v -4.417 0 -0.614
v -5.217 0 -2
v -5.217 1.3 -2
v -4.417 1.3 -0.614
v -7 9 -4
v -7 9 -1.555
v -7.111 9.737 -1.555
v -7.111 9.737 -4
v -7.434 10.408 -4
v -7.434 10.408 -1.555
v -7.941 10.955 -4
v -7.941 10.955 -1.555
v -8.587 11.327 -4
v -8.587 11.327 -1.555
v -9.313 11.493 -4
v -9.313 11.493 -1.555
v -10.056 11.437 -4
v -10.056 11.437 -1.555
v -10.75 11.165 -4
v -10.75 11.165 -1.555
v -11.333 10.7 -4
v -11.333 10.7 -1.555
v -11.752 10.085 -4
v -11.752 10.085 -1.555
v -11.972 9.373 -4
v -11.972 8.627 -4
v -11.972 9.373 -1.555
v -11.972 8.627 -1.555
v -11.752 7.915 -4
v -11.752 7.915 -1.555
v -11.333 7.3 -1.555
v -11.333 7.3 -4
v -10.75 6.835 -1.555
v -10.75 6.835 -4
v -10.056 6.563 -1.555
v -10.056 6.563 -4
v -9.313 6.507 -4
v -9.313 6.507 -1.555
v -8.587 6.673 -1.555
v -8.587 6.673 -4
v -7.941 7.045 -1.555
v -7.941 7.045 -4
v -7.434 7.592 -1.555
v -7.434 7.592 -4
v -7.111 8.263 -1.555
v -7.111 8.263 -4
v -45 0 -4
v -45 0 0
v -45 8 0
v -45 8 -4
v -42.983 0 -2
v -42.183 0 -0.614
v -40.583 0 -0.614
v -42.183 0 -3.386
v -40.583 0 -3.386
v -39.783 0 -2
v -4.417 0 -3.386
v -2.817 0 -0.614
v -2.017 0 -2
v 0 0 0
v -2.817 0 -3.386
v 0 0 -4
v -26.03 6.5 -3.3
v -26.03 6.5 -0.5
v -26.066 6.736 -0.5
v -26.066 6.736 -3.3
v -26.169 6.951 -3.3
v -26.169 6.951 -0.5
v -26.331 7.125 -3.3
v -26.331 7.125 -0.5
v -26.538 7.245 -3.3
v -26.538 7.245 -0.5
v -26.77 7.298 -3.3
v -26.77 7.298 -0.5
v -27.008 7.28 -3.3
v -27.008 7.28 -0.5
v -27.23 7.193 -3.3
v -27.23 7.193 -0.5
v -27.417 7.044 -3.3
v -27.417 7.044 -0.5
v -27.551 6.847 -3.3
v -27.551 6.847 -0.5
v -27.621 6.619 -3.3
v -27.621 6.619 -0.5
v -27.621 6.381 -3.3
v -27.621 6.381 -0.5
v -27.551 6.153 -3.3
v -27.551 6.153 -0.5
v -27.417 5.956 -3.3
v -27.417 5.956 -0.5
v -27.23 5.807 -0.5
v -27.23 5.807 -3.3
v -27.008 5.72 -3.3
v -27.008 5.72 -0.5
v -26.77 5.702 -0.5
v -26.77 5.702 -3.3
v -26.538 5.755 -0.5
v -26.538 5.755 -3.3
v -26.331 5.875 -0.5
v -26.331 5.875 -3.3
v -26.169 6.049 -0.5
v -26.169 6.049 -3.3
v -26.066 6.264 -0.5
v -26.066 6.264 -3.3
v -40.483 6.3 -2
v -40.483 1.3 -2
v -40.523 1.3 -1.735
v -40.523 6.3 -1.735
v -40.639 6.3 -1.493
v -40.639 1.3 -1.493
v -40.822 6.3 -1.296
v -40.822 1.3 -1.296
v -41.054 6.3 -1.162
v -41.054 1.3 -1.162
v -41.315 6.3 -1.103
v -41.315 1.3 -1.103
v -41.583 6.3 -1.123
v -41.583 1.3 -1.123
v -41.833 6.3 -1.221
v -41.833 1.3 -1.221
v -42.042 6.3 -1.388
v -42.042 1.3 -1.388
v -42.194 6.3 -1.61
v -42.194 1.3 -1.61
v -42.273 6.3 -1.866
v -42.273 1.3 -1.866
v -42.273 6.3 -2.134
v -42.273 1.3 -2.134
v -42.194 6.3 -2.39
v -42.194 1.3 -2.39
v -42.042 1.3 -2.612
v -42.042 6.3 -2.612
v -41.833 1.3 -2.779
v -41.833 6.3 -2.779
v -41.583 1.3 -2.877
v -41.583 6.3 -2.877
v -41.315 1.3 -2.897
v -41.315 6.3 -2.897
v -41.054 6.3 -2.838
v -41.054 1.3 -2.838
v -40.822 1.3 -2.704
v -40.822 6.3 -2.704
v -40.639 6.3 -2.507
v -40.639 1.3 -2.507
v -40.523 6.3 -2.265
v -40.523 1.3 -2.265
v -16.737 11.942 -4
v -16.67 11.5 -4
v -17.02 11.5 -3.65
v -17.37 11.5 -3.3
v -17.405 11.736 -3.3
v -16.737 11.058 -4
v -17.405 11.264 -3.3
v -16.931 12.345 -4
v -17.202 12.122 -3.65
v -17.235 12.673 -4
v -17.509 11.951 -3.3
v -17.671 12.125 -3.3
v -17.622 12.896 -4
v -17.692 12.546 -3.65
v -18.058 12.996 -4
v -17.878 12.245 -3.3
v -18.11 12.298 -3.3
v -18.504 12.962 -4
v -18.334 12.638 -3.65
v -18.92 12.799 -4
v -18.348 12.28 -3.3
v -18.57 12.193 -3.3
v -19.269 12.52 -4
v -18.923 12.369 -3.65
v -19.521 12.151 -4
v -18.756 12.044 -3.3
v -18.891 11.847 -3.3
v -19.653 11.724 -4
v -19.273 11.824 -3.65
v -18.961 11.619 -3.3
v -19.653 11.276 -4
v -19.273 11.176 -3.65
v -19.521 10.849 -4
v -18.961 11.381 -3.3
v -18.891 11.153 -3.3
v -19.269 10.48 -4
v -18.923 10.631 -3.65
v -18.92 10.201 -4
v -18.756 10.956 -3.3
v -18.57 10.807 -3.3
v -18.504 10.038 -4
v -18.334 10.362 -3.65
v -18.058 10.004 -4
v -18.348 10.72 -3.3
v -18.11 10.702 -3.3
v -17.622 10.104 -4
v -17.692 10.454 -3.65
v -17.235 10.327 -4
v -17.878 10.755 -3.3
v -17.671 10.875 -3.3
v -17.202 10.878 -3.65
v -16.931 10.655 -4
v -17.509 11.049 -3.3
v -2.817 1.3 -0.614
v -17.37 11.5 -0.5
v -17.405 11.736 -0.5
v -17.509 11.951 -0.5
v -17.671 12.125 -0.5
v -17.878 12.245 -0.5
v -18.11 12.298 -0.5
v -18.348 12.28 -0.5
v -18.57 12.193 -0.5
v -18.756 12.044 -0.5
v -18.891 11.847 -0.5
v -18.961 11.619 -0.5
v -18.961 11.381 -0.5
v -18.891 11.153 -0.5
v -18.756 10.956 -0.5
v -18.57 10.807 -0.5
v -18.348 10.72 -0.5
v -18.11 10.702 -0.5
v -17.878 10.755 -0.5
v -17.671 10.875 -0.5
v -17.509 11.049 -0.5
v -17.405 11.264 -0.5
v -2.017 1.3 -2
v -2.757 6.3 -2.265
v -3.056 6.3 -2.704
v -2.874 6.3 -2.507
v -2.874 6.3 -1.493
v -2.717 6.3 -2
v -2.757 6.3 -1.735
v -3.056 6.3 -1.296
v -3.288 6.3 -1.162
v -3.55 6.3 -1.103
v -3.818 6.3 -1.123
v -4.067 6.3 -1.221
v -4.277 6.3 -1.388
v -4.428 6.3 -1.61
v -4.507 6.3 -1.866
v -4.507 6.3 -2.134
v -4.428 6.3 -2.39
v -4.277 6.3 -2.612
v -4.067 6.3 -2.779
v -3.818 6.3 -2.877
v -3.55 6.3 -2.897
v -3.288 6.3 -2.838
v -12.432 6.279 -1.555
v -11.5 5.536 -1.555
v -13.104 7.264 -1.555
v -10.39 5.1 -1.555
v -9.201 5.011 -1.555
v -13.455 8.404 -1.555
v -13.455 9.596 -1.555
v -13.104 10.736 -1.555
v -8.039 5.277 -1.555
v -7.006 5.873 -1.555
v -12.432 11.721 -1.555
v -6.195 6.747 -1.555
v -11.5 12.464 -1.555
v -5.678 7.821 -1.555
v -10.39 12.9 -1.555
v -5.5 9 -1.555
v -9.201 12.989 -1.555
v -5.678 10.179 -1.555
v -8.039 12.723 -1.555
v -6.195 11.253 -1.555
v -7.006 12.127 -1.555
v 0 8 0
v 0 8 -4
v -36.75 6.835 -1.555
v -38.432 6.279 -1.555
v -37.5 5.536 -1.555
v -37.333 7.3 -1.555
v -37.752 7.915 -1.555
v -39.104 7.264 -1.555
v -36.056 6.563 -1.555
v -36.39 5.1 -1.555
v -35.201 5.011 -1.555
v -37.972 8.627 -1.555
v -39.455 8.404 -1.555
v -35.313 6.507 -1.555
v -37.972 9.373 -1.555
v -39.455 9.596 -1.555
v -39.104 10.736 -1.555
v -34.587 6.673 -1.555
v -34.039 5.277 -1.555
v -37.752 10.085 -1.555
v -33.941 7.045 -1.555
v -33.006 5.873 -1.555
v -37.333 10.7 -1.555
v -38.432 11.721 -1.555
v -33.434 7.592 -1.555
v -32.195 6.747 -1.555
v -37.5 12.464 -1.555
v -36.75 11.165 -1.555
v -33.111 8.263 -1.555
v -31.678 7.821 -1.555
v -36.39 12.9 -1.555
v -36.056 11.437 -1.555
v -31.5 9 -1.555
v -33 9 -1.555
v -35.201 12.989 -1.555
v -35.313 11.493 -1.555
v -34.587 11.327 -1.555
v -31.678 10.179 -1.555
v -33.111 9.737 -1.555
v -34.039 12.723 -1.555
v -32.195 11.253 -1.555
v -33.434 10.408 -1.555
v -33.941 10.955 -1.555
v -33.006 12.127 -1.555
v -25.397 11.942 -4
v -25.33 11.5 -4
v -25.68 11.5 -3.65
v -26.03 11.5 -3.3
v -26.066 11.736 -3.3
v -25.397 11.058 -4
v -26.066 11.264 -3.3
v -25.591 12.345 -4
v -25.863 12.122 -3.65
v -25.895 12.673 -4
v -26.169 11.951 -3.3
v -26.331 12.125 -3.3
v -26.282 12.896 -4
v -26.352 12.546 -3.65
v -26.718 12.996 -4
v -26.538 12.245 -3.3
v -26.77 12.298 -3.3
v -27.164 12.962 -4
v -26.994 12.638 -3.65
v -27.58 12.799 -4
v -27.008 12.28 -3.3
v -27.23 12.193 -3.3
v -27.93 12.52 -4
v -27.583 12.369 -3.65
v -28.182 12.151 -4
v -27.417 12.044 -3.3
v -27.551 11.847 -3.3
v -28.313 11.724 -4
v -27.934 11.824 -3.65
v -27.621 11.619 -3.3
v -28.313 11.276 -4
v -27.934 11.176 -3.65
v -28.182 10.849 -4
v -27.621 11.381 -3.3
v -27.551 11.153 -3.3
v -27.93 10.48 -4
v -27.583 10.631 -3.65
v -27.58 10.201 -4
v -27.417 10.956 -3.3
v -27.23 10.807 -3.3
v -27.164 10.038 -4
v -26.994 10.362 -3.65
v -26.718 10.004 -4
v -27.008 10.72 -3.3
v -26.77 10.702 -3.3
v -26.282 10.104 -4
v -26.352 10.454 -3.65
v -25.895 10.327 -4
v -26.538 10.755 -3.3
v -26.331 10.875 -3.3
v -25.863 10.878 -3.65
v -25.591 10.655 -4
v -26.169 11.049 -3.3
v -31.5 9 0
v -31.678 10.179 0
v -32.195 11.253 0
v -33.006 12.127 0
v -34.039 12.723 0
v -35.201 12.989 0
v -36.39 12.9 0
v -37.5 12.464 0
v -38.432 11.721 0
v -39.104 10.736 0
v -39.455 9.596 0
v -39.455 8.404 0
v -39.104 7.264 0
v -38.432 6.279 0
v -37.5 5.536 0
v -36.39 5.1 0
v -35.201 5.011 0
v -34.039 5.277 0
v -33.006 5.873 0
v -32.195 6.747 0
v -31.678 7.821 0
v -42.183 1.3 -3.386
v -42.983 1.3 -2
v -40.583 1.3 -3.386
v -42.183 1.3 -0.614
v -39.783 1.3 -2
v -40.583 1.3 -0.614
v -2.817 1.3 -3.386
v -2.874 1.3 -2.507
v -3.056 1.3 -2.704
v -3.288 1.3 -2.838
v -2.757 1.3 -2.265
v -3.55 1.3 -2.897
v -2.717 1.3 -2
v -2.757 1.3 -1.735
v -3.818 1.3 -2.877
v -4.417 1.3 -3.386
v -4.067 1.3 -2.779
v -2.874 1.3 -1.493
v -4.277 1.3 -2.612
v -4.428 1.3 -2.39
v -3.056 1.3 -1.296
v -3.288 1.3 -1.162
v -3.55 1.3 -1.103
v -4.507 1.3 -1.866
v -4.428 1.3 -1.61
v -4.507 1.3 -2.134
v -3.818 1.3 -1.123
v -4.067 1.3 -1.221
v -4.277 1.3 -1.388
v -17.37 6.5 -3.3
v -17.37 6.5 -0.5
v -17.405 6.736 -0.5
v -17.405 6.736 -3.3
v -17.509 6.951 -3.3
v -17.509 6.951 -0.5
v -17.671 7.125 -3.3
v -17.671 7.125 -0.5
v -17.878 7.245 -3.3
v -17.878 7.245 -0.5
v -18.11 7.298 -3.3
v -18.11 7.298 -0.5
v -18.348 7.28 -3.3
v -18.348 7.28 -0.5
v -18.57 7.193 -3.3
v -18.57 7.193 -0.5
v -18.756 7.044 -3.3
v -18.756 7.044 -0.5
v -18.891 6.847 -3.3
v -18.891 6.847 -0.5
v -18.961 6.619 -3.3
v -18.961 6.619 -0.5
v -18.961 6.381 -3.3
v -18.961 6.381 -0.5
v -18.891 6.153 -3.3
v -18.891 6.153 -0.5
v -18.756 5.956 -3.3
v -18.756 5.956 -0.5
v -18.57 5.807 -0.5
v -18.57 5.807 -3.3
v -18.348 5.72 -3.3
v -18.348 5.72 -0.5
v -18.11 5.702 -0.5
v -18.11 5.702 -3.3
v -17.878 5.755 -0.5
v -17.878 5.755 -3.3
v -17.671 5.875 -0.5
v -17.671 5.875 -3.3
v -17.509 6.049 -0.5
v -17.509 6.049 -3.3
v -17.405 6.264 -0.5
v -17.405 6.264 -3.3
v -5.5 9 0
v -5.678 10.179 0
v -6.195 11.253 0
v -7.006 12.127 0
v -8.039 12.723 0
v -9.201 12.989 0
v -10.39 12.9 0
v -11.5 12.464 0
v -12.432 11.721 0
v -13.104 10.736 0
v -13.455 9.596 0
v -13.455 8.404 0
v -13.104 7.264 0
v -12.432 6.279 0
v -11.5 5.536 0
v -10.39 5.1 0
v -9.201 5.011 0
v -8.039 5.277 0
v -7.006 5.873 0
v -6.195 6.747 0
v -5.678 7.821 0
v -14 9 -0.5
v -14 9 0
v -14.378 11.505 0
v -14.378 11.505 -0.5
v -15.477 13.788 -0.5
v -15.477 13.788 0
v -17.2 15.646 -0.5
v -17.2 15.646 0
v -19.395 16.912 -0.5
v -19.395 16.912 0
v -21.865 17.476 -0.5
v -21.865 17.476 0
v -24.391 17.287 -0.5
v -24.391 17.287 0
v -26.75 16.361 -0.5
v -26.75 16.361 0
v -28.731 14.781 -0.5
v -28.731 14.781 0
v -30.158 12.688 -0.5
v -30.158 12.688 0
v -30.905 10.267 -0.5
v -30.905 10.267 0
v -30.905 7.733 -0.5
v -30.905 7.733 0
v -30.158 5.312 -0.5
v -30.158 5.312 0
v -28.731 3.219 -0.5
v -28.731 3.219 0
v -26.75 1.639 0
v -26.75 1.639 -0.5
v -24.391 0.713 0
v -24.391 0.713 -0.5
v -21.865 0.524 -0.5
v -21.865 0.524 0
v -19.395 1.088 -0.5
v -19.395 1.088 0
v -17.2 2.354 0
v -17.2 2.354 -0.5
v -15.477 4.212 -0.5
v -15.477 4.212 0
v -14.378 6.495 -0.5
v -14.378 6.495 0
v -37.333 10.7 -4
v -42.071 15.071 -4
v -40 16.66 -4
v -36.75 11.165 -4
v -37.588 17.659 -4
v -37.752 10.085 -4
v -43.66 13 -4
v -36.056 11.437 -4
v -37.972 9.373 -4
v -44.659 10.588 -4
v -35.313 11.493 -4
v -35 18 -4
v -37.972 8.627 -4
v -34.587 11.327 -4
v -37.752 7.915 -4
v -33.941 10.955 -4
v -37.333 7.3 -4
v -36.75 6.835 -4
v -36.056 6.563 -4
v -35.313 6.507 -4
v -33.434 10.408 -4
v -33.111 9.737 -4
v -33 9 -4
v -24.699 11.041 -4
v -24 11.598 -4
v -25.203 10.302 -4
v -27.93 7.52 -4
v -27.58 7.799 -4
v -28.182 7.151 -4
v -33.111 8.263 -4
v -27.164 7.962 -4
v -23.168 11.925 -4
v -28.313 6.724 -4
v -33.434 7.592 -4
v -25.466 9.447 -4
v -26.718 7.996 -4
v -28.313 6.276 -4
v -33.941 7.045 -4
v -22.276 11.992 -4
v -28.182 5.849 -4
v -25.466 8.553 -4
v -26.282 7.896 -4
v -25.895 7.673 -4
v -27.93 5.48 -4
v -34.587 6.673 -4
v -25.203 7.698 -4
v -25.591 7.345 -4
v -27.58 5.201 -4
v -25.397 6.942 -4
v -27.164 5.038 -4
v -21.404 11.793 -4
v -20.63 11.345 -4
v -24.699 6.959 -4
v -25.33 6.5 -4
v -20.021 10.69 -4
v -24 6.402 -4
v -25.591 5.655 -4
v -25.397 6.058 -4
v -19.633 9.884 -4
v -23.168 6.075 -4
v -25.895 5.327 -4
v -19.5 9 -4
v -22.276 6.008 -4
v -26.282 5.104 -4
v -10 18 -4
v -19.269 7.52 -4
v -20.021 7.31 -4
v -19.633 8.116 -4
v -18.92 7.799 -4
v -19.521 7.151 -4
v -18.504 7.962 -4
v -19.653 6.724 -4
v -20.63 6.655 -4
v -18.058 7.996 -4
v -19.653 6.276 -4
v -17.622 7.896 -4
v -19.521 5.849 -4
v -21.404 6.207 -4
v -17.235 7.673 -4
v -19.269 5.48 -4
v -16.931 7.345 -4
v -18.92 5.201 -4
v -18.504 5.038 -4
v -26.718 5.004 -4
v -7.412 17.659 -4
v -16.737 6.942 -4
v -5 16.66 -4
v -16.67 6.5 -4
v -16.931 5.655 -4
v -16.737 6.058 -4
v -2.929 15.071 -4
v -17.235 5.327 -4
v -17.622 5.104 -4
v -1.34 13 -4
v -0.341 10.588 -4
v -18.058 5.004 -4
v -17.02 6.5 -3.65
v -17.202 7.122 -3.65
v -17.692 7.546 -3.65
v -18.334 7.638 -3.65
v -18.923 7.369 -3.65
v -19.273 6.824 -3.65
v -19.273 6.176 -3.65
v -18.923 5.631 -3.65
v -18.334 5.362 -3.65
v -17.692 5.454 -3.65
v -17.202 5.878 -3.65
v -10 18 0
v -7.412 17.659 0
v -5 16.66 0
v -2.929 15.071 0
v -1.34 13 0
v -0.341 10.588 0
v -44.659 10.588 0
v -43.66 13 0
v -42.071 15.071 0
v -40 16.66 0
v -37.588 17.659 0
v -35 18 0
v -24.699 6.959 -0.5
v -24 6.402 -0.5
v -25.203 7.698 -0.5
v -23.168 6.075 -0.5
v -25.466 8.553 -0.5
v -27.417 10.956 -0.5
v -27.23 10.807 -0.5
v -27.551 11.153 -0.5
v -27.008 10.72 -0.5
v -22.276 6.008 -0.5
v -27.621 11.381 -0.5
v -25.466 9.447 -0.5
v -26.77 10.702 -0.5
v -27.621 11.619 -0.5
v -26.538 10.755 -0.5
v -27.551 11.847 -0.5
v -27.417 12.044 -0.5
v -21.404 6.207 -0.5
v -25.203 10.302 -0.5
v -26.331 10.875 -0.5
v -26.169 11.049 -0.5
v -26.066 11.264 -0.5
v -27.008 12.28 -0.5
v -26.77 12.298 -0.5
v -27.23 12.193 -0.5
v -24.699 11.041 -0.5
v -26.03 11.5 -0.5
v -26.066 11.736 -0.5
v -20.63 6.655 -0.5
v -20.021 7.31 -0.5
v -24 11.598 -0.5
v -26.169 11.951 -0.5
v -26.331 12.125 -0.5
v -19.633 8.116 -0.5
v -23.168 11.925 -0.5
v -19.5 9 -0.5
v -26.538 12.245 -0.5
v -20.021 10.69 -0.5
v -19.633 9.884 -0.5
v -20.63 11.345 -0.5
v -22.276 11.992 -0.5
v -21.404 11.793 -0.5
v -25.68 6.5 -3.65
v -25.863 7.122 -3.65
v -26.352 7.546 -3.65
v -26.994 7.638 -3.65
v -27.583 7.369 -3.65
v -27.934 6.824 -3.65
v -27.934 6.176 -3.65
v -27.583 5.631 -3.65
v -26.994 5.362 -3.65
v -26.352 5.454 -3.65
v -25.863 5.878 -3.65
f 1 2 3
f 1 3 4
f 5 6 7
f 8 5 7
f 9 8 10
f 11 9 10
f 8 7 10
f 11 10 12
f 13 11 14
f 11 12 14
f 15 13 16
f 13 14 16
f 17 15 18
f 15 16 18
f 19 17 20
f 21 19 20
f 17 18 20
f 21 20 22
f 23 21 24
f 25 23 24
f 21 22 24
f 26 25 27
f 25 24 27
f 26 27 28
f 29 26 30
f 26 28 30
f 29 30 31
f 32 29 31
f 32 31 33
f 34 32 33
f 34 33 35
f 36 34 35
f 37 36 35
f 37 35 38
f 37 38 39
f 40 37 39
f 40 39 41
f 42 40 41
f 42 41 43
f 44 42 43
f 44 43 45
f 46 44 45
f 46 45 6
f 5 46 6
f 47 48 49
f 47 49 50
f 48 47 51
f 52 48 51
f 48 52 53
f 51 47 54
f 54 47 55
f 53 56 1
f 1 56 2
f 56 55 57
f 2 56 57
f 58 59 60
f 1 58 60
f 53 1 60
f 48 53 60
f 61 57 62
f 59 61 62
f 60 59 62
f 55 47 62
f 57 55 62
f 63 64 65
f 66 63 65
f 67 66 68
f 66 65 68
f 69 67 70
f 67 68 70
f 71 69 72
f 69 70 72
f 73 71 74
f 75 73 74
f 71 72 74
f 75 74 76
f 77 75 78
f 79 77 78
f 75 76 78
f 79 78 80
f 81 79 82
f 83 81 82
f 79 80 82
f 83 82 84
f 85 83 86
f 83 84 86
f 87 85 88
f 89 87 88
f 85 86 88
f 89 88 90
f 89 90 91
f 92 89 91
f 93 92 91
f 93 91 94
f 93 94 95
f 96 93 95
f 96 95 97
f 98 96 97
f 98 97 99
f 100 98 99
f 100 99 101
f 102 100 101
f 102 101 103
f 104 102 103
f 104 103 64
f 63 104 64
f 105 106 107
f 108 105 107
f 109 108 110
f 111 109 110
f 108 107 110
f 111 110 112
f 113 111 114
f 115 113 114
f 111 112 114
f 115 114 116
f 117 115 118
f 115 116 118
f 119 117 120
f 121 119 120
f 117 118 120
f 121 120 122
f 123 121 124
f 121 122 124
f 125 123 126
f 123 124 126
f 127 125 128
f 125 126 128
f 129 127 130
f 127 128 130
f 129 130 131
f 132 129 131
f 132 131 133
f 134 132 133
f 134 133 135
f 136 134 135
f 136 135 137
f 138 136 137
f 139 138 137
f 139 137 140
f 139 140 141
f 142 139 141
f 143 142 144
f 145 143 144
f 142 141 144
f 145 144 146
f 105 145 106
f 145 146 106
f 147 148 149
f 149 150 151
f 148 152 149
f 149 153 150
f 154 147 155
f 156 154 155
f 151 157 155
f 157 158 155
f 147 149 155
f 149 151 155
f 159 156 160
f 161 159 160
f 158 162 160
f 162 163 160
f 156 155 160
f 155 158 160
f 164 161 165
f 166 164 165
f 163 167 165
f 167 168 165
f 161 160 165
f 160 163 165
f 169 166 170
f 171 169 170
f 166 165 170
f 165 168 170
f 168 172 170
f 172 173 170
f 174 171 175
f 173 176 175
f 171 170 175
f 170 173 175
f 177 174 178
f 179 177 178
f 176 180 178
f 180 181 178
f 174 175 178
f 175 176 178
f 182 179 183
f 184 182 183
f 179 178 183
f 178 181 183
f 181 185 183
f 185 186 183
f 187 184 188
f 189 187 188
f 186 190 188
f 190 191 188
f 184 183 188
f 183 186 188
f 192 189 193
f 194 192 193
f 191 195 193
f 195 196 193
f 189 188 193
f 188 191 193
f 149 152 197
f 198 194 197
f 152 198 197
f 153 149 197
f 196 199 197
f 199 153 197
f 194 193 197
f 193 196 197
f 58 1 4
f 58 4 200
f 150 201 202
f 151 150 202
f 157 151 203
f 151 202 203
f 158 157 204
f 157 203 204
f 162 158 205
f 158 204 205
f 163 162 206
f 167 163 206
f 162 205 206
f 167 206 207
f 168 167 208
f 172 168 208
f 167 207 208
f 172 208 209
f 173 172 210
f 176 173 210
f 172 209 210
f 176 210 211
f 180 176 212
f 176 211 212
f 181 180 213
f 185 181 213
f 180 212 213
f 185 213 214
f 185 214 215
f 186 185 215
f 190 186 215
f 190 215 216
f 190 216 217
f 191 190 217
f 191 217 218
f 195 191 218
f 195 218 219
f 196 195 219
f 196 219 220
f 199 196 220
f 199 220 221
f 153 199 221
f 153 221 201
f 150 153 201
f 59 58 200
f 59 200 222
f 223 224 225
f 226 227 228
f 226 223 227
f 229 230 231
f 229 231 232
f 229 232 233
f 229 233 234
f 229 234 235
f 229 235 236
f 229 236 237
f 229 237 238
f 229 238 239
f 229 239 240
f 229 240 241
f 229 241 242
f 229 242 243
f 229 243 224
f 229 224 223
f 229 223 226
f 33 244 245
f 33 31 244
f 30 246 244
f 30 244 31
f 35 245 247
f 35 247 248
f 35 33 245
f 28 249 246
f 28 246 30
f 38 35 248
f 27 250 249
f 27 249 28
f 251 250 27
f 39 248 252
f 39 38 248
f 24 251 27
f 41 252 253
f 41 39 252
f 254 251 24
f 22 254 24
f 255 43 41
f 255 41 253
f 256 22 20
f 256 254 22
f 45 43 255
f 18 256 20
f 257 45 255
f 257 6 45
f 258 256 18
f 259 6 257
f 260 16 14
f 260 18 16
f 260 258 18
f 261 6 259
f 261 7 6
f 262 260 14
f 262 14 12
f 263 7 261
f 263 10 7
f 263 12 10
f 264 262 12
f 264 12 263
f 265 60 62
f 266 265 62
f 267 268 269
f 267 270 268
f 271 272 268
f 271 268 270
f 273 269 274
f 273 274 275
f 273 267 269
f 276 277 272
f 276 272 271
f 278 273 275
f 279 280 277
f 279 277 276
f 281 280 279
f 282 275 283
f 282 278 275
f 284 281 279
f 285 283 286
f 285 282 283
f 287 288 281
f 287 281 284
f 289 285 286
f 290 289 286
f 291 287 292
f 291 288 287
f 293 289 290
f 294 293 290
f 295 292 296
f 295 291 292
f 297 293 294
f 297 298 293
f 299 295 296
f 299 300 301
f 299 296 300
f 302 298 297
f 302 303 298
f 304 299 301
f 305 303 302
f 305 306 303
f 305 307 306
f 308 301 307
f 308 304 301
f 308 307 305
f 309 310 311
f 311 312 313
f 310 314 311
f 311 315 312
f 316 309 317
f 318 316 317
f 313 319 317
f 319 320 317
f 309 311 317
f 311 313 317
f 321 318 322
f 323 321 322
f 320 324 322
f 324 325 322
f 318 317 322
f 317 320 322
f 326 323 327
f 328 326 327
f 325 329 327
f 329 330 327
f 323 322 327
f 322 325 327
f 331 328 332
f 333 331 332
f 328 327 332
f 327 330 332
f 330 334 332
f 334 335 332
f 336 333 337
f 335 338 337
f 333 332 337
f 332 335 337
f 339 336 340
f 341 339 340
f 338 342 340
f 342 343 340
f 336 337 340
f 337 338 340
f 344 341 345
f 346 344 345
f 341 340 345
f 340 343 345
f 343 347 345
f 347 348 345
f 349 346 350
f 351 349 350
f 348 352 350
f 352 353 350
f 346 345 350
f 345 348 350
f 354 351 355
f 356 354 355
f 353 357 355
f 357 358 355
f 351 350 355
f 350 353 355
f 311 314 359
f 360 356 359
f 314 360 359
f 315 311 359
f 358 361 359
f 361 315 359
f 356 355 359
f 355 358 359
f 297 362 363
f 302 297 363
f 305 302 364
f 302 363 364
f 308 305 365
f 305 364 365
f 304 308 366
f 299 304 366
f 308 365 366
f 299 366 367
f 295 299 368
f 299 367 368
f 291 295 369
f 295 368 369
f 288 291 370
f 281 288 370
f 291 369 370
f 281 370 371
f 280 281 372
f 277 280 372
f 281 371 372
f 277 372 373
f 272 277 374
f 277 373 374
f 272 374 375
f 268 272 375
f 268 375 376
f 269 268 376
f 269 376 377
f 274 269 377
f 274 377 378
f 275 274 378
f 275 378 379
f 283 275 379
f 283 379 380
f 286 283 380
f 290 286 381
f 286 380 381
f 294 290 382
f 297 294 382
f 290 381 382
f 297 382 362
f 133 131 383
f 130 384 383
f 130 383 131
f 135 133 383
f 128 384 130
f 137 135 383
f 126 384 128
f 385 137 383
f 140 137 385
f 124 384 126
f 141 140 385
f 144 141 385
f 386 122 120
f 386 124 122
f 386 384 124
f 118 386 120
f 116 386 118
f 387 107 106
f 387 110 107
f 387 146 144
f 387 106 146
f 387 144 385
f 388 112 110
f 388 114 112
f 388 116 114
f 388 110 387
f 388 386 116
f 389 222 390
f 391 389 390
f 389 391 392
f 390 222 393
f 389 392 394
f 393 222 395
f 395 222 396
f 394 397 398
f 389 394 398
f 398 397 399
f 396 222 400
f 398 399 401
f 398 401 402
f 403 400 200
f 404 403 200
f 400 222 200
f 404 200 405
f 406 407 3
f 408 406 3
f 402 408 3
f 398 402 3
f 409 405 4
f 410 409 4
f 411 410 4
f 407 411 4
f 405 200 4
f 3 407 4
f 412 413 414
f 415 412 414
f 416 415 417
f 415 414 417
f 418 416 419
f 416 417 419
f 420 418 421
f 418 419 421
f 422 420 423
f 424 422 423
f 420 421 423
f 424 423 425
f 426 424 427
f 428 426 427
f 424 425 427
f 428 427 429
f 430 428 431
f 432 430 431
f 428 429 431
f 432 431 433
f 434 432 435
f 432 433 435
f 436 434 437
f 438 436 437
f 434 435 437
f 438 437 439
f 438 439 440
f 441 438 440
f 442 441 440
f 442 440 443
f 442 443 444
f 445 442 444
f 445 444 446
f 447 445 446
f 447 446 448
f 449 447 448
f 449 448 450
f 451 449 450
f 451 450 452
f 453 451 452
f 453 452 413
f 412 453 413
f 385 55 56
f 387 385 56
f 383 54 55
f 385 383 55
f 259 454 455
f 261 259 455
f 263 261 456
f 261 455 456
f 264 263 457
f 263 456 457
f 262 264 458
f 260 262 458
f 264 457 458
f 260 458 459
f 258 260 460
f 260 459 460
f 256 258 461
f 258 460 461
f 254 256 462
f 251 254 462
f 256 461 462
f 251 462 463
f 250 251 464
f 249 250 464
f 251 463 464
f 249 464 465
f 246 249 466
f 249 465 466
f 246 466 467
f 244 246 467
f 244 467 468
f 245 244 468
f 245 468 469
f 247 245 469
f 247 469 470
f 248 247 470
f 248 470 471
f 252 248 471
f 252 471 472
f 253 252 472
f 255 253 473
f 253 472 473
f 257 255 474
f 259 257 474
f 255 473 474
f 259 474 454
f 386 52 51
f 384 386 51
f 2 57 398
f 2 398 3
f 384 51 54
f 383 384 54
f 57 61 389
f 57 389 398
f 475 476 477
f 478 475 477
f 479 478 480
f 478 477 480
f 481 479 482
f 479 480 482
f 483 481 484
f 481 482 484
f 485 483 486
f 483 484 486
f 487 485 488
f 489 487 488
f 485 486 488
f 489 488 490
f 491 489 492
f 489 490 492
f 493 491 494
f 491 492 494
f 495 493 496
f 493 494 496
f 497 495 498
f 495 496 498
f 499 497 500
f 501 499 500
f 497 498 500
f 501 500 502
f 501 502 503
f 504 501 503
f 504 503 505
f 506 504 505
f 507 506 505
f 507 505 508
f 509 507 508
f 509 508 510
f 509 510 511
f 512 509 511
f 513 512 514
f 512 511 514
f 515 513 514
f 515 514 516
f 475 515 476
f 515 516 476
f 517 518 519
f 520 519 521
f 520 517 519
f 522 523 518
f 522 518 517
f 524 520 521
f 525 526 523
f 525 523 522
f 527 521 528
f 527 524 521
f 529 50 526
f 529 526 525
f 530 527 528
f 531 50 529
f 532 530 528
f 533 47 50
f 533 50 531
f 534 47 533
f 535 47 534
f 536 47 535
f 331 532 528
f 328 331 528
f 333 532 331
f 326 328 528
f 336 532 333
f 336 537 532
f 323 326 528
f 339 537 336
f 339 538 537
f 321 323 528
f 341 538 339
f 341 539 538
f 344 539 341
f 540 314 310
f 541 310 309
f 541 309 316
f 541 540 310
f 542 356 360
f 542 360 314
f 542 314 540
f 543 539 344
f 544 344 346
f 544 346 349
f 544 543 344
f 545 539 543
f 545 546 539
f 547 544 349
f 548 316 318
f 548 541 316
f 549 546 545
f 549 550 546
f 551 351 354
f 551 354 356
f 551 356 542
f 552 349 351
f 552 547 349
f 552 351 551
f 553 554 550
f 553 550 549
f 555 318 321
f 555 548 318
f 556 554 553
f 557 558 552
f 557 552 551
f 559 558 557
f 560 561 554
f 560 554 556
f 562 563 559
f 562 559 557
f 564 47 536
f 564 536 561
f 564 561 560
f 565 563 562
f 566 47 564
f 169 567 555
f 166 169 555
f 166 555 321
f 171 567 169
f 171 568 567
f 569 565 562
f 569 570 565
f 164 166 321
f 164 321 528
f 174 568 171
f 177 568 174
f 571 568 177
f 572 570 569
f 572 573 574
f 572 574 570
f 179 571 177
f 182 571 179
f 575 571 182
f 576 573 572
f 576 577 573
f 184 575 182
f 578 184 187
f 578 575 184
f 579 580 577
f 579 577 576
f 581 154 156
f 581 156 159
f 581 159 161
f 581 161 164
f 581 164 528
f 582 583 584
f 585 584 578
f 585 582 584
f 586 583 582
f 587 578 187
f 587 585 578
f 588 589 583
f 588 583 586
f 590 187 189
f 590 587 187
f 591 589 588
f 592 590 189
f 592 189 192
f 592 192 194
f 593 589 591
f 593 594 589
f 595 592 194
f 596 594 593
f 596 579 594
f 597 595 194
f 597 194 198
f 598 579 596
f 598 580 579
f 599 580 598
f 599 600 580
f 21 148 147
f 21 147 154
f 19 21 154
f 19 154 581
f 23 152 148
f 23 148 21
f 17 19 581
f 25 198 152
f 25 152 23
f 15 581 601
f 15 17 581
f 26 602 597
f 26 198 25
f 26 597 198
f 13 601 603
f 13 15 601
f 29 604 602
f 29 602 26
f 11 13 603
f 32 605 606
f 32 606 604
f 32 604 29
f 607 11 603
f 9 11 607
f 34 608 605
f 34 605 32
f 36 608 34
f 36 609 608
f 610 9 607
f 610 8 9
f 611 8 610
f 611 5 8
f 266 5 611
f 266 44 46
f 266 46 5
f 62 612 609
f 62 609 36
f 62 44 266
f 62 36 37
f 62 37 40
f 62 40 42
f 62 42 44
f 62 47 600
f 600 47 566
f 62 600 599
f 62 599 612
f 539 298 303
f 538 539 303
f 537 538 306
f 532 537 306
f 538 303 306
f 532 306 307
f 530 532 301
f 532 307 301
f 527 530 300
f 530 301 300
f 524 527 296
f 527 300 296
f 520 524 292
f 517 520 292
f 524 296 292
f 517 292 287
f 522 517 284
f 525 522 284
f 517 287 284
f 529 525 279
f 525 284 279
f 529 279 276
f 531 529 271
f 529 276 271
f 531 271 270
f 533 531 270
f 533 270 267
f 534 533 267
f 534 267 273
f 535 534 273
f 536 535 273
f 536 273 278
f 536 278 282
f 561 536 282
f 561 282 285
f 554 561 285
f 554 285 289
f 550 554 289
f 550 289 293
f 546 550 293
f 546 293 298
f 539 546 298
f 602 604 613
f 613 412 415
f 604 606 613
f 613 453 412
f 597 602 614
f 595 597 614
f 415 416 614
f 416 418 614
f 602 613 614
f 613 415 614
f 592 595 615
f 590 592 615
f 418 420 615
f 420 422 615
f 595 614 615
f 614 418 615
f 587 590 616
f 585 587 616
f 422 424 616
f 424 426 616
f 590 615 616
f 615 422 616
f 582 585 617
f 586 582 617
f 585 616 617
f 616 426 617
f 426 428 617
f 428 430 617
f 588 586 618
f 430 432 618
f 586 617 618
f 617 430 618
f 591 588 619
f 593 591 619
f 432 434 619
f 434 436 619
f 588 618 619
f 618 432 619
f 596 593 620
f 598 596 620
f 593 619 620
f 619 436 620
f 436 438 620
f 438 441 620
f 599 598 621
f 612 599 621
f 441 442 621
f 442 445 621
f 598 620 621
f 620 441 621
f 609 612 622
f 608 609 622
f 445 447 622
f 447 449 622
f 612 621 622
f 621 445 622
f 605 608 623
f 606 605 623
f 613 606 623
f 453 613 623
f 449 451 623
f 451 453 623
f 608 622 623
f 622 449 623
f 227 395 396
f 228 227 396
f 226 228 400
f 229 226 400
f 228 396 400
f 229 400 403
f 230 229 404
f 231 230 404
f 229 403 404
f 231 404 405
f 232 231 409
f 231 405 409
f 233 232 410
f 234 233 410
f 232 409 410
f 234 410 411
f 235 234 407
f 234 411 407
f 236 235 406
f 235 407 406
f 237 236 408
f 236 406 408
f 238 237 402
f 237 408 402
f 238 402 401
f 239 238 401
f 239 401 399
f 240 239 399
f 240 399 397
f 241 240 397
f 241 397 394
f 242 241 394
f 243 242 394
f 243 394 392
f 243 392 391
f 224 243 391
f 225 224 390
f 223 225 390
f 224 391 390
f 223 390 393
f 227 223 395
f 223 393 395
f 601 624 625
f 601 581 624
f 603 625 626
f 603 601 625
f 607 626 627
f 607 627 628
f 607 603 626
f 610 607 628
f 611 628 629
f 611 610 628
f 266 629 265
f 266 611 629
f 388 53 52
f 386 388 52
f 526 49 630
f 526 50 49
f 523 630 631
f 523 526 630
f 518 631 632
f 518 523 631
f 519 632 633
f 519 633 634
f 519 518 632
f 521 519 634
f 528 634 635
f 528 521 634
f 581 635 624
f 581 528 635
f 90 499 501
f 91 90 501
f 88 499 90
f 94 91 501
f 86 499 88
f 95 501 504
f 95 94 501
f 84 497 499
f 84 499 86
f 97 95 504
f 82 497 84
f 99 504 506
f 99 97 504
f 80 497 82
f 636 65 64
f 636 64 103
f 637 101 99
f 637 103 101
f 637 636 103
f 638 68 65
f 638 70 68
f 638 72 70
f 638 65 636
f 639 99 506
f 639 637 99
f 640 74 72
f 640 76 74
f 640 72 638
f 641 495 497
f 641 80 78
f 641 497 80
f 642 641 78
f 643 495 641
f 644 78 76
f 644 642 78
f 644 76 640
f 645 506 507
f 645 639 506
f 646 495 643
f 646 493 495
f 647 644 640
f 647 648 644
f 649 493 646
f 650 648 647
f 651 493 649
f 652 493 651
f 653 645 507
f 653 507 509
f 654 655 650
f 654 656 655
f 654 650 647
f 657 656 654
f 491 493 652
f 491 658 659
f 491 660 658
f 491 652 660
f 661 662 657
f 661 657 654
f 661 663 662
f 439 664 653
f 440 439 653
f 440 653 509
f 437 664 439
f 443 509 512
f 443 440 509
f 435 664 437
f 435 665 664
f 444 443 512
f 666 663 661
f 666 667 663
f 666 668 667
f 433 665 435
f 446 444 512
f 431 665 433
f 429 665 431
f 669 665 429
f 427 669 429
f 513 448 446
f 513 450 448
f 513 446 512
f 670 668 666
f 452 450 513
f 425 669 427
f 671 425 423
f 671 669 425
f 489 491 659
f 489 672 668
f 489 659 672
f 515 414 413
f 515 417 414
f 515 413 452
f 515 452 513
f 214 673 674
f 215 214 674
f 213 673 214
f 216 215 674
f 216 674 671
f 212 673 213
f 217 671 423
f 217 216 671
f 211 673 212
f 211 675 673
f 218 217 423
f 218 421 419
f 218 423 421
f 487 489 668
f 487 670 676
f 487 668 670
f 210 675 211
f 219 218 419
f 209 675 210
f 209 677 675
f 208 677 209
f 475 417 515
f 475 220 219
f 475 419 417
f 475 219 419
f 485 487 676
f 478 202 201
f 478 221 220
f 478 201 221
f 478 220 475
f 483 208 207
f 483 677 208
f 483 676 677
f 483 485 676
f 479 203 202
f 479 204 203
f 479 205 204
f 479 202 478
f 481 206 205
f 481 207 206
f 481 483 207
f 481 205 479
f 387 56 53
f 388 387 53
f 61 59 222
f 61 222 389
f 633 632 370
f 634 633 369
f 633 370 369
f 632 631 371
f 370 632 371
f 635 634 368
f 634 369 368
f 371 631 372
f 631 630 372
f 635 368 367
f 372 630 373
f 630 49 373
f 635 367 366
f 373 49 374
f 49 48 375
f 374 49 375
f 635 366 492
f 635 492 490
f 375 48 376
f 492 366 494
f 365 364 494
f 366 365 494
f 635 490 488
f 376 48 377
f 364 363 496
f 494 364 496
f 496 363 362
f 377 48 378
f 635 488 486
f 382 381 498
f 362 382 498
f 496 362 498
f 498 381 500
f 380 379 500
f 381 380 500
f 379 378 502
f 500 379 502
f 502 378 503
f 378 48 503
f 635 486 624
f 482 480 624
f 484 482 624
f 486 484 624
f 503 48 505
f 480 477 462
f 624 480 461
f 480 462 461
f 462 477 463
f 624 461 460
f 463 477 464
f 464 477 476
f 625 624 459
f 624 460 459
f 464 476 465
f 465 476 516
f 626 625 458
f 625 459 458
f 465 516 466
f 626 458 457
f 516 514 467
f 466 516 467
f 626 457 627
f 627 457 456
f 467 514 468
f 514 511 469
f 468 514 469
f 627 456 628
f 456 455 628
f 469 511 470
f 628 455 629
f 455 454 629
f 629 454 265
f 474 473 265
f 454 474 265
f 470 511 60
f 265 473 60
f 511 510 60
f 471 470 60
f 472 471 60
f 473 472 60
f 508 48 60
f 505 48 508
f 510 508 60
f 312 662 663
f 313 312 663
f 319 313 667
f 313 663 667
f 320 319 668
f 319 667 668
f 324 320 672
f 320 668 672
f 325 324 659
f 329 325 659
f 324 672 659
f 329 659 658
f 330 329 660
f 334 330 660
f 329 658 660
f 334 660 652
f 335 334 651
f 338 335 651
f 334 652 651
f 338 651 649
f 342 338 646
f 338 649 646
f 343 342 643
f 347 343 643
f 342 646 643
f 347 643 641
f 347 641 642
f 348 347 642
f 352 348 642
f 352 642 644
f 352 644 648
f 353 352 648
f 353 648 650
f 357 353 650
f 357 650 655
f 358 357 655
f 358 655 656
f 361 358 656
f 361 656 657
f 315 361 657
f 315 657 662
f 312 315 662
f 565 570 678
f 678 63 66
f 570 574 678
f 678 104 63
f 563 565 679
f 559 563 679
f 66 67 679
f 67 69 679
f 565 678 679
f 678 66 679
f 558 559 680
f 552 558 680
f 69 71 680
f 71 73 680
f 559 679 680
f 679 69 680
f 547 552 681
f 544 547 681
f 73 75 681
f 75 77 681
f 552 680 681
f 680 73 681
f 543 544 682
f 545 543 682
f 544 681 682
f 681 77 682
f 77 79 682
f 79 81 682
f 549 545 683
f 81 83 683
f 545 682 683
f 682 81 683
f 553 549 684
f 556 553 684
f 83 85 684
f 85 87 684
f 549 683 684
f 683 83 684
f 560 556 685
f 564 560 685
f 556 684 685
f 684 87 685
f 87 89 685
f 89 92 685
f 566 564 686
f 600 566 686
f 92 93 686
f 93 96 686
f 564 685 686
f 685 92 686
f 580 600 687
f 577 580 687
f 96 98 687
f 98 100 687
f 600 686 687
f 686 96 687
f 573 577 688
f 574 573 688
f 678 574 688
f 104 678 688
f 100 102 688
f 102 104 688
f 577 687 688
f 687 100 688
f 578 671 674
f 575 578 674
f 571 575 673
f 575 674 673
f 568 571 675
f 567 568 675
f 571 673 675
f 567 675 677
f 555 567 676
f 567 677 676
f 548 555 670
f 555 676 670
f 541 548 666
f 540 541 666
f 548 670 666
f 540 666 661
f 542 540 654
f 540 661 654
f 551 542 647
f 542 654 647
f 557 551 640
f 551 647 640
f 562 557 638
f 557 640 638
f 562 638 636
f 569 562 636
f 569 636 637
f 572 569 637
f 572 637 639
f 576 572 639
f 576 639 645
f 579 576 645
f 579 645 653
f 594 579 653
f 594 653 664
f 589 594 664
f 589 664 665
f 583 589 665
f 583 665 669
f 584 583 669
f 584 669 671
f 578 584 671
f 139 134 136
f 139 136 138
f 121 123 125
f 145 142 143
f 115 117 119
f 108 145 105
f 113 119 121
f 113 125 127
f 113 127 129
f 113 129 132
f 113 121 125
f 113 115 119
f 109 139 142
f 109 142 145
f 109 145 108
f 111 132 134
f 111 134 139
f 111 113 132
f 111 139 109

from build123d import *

# Parameters (mm, degrees)
SKETCH1_W           = 45
SKETCH1_H           = 4
BOSS_EXTRUDE1_DEPTH = 18
SKETCH2_R           = 8.5
CUT_EXTRUDE2_DEPTH  = 0.5
SKETCH3_R           = 3
CUT_EXTRUDE3_DEPTH  = 4.5
SKETCH4_R           = 2.5
CUT_EXTRUDE4_DEPTH  = 5
SKETCH6_R           = 0.8
CUT_EXTRUDE6_DEPTH  = 4.5
FILLET1_R           = 10
SKETCH7_R           = 4
CUT_EXTRUDE7_DEPTH  = 1.555
CUT_EXTRUDE8_DEPTH  = 1.3
SKETCH9_R           = 0.9
CUT_EXTRUDE9_DEPTH  = 5
SKETCH10_R          = 0.9
CUT_EXTRUDE10_DEPTH = 5
CHAMFER1_SIZE       = 0.7


with BuildPart() as part:
    # Sketch1 → Boss-Extrude1 (new body)
    with BuildSketch(Plane(origin=(0, 0, 0), x_dir=(1, 0, 0), z_dir=(0, 1, 0))):
        with Locations((-22.5, 2)):
            Rectangle(SKETCH1_W, SKETCH1_H)
    extrude(amount=BOSS_EXTRUDE1_DEPTH)

    # Sketch2 → Cut-Extrude2 (cut)
    with BuildSketch(Plane.XY):
        with Locations((-22.5, 9)):
            Circle(SKETCH2_R)
    extrude(amount=-CUT_EXTRUDE2_DEPTH, mode=Mode.SUBTRACT)

    # Sketch3 → Cut-Extrude3 (cut, through all)
    with BuildSketch(Plane.XY.offset(-0.5)):
        with Locations((-22.5, 9)):
            Circle(SKETCH3_R)
    extrude(amount=-CUT_EXTRUDE3_DEPTH, mode=Mode.SUBTRACT)

    # Sketch4 → Cut-Extrude4 (cut, through all)
    with BuildSketch(Plane.XY):
        with Locations((-35.5, 9)):
            Circle(SKETCH4_R)
        with Locations((-9.5, 9)):
            Circle(SKETCH4_R)
    extrude(amount=-CUT_EXTRUDE4_DEPTH, mode=Mode.SUBTRACT)

    # Sketch6 → Cut-Extrude6 (cut, through all)
    with BuildSketch(Plane.XY.offset(-0.5)):
        with Locations((-18.169872981, 11.5)):
            Circle(SKETCH6_R)
        with Locations((-18.169872981, 6.5)):
            Circle(SKETCH6_R)
        with Locations((-26.830127019, 6.5)):
            Circle(SKETCH6_R)
        with Locations((-26.830127019, 11.5)):
            Circle(SKETCH6_R)
    extrude(amount=-CUT_EXTRUDE6_DEPTH, mode=Mode.SUBTRACT)

    # Fillet1
    fillet1_edges = [part.edges().sort_by_distance(p)[0] for p in [
        (-45, 18, -2),
        (0, 18, -2),
    ]]
    fillet(fillet1_edges, radius=FILLET1_R)

    # Sketch7 → Cut-Extrude7 (cut)
    with BuildSketch(Plane.XY):
        with Locations((-35.5, 9)):
            Circle(SKETCH7_R)
        with Locations((-9.5, 9)):
            Circle(SKETCH7_R)
    extrude(amount=-CUT_EXTRUDE7_DEPTH, mode=Mode.SUBTRACT)

    # Sketch8 → Cut-Extrude8 (cut)
    with BuildSketch(Plane.XZ):
        Polygon((-5.217293911, -2), (-4.417293911, -0.614359354), (-2.817293911, -0.614359354), (-2.017293911, -2), (-2.817293911, -3.385640646), (-4.417293911, -3.385640646), align=None)
        Polygon((-39.782706089, -2), (-40.582706089, -0.614359354), (-42.182706089, -0.614359354), (-42.982706089, -2), (-42.182706089, -3.385640646), (-40.582706089, -3.385640646), align=None)
    extrude(amount=-CUT_EXTRUDE8_DEPTH, mode=Mode.SUBTRACT)

    # Sketch9 → Cut-Extrude9 (cut)
    with BuildSketch(Plane.XZ.offset(-1.3)):
        with Locations((-41.382706089, -2)):
            Circle(SKETCH9_R)
    extrude(amount=-CUT_EXTRUDE9_DEPTH, mode=Mode.SUBTRACT)

    # Sketch10 → Cut-Extrude10 (cut)
    with BuildSketch(Plane.XZ.offset(-1.3)):
        with Locations((-3.617293911, -2)):
            Circle(SKETCH10_R)
    extrude(amount=-CUT_EXTRUDE10_DEPTH, mode=Mode.SUBTRACT)

    # Chamfer1
    chamfer1_edges = [part.edges().sort_by_distance(p)[0] for p in [
        (-27.630127019, 11.5, -4),
        (-18.969872981, 11.5, -4),
        (-18.969872981, 6.5, -4),
        (-27.630127019, 6.5, -4),
    ]]
    chamfer(chamfer1_edges, length=CHAMFER1_SIZE)


solid = part.part
